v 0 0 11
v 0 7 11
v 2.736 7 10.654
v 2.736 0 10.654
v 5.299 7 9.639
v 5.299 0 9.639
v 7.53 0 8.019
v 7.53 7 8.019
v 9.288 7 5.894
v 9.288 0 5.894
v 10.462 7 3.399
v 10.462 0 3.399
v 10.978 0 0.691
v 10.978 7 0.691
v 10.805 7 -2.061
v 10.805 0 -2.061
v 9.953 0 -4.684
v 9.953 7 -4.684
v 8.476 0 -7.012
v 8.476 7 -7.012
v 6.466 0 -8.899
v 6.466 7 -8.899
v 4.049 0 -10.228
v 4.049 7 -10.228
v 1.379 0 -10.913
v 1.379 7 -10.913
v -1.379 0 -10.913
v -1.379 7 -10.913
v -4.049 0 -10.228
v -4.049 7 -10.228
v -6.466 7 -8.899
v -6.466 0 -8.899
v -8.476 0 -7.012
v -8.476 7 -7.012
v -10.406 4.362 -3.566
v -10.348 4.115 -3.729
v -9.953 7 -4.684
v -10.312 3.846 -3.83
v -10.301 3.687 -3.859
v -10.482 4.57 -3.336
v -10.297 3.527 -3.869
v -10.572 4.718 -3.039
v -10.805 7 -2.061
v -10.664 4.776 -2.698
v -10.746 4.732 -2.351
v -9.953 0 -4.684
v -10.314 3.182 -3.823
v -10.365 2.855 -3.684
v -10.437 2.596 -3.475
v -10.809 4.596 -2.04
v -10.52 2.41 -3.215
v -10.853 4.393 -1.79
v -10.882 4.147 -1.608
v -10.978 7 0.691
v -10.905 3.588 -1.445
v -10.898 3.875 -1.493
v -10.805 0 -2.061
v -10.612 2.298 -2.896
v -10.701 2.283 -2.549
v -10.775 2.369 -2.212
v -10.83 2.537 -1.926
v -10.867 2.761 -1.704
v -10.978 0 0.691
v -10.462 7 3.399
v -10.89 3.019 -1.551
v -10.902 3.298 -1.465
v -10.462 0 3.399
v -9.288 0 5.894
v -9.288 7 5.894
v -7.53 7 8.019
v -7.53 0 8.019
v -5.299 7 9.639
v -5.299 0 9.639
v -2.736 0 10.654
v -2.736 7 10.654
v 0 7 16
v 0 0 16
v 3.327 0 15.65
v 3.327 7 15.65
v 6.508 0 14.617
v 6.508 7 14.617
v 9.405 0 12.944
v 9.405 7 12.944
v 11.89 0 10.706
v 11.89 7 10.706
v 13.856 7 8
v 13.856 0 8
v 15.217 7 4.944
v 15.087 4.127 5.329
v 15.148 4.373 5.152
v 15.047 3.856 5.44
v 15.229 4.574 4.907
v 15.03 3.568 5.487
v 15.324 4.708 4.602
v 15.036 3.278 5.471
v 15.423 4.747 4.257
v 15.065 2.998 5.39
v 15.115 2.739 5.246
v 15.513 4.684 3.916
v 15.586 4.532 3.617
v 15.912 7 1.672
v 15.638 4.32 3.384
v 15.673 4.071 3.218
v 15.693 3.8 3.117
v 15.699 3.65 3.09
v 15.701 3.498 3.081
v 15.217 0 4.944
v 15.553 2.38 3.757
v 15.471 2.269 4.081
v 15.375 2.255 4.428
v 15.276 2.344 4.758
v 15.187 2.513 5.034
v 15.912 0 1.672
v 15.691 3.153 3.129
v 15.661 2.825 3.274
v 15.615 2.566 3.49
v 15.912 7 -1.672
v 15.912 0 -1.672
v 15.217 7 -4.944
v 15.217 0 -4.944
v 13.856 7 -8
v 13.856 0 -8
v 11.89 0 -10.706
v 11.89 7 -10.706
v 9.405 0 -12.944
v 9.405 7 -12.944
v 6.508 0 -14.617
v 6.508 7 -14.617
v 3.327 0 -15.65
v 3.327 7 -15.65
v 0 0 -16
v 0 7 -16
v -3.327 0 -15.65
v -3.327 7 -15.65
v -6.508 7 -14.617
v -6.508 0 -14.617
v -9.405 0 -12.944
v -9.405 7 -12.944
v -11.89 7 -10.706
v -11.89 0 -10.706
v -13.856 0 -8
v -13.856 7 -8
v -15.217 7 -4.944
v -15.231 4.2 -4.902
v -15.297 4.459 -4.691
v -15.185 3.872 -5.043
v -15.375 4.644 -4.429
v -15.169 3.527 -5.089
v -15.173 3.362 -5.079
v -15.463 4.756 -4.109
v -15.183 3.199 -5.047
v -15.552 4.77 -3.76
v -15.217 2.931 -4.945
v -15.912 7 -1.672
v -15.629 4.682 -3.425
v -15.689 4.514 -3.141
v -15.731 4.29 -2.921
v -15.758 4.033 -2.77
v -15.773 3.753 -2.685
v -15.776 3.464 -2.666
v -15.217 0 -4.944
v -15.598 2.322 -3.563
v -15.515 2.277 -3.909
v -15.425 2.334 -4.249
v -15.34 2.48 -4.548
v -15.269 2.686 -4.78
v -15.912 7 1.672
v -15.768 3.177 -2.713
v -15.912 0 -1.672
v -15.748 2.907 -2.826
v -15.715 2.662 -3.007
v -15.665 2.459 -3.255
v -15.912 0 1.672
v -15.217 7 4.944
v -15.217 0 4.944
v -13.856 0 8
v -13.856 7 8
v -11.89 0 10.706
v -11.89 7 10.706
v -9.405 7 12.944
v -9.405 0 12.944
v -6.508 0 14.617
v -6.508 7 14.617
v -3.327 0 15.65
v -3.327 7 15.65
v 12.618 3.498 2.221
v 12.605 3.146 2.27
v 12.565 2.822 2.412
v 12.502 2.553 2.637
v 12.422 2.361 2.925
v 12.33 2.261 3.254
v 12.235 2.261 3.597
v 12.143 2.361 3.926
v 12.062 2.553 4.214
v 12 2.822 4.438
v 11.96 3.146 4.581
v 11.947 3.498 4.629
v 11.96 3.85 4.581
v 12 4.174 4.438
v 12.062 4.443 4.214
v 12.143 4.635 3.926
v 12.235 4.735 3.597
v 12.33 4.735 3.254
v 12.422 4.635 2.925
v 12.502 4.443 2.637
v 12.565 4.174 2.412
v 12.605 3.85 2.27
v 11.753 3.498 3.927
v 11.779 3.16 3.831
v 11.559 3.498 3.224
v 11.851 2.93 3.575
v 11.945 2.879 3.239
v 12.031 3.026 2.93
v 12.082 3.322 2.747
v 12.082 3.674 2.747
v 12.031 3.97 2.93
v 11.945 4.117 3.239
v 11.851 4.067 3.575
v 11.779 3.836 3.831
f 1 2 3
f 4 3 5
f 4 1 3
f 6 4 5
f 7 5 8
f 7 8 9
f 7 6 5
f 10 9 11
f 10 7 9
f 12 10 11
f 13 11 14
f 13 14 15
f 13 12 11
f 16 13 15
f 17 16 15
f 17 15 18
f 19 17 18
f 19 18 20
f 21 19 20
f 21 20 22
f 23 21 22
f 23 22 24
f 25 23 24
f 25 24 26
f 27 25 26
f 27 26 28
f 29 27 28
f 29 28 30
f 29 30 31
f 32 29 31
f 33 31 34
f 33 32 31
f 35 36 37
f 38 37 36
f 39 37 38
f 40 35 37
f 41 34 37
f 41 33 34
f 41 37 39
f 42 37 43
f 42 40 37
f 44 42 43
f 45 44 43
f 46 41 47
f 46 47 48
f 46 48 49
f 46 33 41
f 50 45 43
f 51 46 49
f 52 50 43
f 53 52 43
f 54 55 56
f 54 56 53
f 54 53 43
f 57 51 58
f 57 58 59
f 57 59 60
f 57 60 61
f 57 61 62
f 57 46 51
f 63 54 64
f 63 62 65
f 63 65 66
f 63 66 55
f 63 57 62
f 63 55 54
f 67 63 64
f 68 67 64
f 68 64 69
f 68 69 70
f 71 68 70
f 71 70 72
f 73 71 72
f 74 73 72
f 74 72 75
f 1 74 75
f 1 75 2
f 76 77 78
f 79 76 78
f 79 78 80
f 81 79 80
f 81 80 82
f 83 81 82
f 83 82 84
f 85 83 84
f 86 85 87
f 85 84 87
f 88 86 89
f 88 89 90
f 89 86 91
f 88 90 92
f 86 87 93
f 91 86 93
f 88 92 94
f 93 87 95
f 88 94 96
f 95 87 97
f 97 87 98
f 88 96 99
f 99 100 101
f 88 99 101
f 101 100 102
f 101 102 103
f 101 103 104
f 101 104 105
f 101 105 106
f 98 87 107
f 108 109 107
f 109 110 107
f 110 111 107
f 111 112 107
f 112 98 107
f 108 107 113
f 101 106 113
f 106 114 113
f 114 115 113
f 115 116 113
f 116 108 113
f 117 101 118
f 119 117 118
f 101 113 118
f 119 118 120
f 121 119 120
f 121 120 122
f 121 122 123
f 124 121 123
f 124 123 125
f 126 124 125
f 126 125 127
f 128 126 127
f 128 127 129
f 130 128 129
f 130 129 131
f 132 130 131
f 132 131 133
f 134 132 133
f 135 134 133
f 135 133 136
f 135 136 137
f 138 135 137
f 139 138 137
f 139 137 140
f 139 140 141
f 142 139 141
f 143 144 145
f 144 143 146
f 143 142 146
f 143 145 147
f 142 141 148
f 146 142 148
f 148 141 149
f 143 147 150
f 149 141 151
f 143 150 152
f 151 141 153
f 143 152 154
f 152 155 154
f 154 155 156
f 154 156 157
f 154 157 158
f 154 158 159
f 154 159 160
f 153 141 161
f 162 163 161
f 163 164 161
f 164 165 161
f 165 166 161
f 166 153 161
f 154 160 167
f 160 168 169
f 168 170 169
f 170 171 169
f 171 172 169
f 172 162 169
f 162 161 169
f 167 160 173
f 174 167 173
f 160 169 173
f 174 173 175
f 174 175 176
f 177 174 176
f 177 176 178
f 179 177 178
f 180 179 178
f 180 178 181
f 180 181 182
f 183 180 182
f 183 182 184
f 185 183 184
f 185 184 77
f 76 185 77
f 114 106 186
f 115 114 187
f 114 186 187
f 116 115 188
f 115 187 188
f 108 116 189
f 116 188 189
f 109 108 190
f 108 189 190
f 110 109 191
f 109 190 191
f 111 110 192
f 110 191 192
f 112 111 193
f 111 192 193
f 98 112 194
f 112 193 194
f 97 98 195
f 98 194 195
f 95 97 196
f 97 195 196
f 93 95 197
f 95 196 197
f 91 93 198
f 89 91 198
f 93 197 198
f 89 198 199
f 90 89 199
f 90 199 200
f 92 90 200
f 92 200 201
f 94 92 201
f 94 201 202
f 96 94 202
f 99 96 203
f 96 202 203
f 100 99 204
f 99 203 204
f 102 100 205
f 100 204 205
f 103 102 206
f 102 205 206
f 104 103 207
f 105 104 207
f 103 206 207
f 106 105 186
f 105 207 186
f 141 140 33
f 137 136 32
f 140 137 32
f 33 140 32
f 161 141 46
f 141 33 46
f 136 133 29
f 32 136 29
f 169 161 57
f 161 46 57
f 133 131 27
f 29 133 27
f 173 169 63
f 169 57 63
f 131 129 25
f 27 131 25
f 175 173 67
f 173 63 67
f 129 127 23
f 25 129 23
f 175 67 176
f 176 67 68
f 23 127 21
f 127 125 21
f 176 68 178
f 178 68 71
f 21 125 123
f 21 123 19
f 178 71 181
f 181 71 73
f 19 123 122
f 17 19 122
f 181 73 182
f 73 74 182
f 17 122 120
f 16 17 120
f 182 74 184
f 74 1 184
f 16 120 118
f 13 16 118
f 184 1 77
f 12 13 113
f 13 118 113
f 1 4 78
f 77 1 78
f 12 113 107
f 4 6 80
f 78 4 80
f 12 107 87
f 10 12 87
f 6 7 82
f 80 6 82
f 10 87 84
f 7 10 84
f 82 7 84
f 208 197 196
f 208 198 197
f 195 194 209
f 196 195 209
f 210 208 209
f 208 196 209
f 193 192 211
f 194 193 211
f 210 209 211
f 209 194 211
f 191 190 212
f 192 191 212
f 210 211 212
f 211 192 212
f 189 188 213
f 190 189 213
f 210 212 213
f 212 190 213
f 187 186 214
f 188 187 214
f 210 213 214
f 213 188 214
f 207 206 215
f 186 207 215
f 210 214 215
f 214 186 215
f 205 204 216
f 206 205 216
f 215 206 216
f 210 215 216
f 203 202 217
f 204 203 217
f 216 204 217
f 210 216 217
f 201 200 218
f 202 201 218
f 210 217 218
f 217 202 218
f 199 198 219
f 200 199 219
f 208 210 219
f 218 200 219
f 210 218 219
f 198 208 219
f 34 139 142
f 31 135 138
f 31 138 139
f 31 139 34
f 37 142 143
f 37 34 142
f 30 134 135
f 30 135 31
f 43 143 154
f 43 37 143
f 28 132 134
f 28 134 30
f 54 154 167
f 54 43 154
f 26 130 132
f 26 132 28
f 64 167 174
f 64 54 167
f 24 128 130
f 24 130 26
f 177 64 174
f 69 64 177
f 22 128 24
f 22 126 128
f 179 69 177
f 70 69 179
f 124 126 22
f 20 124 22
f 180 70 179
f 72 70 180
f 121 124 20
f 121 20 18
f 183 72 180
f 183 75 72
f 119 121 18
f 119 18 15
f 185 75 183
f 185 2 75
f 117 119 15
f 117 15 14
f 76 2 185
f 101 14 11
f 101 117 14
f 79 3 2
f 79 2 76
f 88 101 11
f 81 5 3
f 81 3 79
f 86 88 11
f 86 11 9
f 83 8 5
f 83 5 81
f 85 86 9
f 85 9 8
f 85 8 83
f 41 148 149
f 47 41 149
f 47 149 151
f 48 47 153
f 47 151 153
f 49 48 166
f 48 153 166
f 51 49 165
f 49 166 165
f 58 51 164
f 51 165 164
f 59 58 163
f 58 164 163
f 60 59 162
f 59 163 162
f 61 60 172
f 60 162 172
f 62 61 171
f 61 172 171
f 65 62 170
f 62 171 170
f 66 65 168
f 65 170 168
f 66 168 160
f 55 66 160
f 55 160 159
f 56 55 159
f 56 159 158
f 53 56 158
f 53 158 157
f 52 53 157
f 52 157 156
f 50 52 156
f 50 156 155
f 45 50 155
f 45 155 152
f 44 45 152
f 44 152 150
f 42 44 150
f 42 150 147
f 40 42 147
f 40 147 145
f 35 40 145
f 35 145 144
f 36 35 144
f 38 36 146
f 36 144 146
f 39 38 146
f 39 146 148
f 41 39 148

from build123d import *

# Parameters (mm, degrees)
SKETCH2_R                  = 16
SKETCH2_R_2                = 11
BOSS_EXTRUDE1_DEPTH        = 7
M3X0_5_TAPPED_HOLE1_REACH  = 39.437
M3X0_5_TAPPED_HOLE1_BORE_R = 1.25
M3X0_5_TAPPED_HOLE2_D      = 2.5
M3X0_5_TAPPED_HOLE2_DEPTH  = 3.248924226
M3X0_5_TAPPED_HOLE2_TIP    = 0.751075774


with BuildPart() as part:
    # Sketch2 → Boss-Extrude1 (new body)
    with BuildSketch(Plane(origin=(0, 0, 0), x_dir=(1, 0, 0), z_dir=(0, 1, 0))):
        with Locations(Location((0, 0, 0), (0, 0, 270))):
            Circle(SKETCH2_R)
        with Locations(Location((0, 0, 0), (0, 0, 270))):
            Circle(SKETCH2_R_2, mode=Mode.SUBTRACT)
    extrude(amount=BOSS_EXTRUDE1_DEPTH)

    # M3x0.5 Tapped Hole1 bore (on position points) → M3x0.5 Tapped Hole1 (cut, up to next)
    with BuildSketch(Plane(origin=(-15.520289871, 3.526588003, -3.888521866), x_dir=(0.243032616649, 0, -0.970018116967), z_dir=(-0.970018116967, 0, -0.243032616649)), mode=Mode.PRIVATE) as m3x0_5_tapped_hole1_sk1:
        Circle(M3X0_5_TAPPED_HOLE1_BORE_R)
    m3x0_5_tapped_hole1_tool1 = extrude(m3x0_5_tapped_hole1_sk1.sketch, amount=-M3X0_5_TAPPED_HOLE1_REACH, mode=Mode.PRIVATE) & part.part
    add(m3x0_5_tapped_hole1_tool1.solids().sort_by_distance((-15.52029, 3.526588, -3.888522))[0], mode=Mode.SUBTRACT)

    # M3x0.5 Tapped Hole2
    with Locations(Plane(origin=(15.411877549, 3.498112916, 4.298142669), x_dir=(-0.268633916838, 0, 0.963242346829), z_dir=(0.963242346829, 0, 0.268633916838))):
        with Locations((0, 0)):
            Hole(M3X0_5_TAPPED_HOLE2_D / 2, depth=M3X0_5_TAPPED_HOLE2_DEPTH)
            with Locations((0, 0, -(M3X0_5_TAPPED_HOLE2_DEPTH + M3X0_5_TAPPED_HOLE2_TIP / 2))):  # 118° drill point
                Cone(0, M3X0_5_TAPPED_HOLE2_D / 2, M3X0_5_TAPPED_HOLE2_TIP, mode=Mode.SUBTRACT)


solid = part.part
